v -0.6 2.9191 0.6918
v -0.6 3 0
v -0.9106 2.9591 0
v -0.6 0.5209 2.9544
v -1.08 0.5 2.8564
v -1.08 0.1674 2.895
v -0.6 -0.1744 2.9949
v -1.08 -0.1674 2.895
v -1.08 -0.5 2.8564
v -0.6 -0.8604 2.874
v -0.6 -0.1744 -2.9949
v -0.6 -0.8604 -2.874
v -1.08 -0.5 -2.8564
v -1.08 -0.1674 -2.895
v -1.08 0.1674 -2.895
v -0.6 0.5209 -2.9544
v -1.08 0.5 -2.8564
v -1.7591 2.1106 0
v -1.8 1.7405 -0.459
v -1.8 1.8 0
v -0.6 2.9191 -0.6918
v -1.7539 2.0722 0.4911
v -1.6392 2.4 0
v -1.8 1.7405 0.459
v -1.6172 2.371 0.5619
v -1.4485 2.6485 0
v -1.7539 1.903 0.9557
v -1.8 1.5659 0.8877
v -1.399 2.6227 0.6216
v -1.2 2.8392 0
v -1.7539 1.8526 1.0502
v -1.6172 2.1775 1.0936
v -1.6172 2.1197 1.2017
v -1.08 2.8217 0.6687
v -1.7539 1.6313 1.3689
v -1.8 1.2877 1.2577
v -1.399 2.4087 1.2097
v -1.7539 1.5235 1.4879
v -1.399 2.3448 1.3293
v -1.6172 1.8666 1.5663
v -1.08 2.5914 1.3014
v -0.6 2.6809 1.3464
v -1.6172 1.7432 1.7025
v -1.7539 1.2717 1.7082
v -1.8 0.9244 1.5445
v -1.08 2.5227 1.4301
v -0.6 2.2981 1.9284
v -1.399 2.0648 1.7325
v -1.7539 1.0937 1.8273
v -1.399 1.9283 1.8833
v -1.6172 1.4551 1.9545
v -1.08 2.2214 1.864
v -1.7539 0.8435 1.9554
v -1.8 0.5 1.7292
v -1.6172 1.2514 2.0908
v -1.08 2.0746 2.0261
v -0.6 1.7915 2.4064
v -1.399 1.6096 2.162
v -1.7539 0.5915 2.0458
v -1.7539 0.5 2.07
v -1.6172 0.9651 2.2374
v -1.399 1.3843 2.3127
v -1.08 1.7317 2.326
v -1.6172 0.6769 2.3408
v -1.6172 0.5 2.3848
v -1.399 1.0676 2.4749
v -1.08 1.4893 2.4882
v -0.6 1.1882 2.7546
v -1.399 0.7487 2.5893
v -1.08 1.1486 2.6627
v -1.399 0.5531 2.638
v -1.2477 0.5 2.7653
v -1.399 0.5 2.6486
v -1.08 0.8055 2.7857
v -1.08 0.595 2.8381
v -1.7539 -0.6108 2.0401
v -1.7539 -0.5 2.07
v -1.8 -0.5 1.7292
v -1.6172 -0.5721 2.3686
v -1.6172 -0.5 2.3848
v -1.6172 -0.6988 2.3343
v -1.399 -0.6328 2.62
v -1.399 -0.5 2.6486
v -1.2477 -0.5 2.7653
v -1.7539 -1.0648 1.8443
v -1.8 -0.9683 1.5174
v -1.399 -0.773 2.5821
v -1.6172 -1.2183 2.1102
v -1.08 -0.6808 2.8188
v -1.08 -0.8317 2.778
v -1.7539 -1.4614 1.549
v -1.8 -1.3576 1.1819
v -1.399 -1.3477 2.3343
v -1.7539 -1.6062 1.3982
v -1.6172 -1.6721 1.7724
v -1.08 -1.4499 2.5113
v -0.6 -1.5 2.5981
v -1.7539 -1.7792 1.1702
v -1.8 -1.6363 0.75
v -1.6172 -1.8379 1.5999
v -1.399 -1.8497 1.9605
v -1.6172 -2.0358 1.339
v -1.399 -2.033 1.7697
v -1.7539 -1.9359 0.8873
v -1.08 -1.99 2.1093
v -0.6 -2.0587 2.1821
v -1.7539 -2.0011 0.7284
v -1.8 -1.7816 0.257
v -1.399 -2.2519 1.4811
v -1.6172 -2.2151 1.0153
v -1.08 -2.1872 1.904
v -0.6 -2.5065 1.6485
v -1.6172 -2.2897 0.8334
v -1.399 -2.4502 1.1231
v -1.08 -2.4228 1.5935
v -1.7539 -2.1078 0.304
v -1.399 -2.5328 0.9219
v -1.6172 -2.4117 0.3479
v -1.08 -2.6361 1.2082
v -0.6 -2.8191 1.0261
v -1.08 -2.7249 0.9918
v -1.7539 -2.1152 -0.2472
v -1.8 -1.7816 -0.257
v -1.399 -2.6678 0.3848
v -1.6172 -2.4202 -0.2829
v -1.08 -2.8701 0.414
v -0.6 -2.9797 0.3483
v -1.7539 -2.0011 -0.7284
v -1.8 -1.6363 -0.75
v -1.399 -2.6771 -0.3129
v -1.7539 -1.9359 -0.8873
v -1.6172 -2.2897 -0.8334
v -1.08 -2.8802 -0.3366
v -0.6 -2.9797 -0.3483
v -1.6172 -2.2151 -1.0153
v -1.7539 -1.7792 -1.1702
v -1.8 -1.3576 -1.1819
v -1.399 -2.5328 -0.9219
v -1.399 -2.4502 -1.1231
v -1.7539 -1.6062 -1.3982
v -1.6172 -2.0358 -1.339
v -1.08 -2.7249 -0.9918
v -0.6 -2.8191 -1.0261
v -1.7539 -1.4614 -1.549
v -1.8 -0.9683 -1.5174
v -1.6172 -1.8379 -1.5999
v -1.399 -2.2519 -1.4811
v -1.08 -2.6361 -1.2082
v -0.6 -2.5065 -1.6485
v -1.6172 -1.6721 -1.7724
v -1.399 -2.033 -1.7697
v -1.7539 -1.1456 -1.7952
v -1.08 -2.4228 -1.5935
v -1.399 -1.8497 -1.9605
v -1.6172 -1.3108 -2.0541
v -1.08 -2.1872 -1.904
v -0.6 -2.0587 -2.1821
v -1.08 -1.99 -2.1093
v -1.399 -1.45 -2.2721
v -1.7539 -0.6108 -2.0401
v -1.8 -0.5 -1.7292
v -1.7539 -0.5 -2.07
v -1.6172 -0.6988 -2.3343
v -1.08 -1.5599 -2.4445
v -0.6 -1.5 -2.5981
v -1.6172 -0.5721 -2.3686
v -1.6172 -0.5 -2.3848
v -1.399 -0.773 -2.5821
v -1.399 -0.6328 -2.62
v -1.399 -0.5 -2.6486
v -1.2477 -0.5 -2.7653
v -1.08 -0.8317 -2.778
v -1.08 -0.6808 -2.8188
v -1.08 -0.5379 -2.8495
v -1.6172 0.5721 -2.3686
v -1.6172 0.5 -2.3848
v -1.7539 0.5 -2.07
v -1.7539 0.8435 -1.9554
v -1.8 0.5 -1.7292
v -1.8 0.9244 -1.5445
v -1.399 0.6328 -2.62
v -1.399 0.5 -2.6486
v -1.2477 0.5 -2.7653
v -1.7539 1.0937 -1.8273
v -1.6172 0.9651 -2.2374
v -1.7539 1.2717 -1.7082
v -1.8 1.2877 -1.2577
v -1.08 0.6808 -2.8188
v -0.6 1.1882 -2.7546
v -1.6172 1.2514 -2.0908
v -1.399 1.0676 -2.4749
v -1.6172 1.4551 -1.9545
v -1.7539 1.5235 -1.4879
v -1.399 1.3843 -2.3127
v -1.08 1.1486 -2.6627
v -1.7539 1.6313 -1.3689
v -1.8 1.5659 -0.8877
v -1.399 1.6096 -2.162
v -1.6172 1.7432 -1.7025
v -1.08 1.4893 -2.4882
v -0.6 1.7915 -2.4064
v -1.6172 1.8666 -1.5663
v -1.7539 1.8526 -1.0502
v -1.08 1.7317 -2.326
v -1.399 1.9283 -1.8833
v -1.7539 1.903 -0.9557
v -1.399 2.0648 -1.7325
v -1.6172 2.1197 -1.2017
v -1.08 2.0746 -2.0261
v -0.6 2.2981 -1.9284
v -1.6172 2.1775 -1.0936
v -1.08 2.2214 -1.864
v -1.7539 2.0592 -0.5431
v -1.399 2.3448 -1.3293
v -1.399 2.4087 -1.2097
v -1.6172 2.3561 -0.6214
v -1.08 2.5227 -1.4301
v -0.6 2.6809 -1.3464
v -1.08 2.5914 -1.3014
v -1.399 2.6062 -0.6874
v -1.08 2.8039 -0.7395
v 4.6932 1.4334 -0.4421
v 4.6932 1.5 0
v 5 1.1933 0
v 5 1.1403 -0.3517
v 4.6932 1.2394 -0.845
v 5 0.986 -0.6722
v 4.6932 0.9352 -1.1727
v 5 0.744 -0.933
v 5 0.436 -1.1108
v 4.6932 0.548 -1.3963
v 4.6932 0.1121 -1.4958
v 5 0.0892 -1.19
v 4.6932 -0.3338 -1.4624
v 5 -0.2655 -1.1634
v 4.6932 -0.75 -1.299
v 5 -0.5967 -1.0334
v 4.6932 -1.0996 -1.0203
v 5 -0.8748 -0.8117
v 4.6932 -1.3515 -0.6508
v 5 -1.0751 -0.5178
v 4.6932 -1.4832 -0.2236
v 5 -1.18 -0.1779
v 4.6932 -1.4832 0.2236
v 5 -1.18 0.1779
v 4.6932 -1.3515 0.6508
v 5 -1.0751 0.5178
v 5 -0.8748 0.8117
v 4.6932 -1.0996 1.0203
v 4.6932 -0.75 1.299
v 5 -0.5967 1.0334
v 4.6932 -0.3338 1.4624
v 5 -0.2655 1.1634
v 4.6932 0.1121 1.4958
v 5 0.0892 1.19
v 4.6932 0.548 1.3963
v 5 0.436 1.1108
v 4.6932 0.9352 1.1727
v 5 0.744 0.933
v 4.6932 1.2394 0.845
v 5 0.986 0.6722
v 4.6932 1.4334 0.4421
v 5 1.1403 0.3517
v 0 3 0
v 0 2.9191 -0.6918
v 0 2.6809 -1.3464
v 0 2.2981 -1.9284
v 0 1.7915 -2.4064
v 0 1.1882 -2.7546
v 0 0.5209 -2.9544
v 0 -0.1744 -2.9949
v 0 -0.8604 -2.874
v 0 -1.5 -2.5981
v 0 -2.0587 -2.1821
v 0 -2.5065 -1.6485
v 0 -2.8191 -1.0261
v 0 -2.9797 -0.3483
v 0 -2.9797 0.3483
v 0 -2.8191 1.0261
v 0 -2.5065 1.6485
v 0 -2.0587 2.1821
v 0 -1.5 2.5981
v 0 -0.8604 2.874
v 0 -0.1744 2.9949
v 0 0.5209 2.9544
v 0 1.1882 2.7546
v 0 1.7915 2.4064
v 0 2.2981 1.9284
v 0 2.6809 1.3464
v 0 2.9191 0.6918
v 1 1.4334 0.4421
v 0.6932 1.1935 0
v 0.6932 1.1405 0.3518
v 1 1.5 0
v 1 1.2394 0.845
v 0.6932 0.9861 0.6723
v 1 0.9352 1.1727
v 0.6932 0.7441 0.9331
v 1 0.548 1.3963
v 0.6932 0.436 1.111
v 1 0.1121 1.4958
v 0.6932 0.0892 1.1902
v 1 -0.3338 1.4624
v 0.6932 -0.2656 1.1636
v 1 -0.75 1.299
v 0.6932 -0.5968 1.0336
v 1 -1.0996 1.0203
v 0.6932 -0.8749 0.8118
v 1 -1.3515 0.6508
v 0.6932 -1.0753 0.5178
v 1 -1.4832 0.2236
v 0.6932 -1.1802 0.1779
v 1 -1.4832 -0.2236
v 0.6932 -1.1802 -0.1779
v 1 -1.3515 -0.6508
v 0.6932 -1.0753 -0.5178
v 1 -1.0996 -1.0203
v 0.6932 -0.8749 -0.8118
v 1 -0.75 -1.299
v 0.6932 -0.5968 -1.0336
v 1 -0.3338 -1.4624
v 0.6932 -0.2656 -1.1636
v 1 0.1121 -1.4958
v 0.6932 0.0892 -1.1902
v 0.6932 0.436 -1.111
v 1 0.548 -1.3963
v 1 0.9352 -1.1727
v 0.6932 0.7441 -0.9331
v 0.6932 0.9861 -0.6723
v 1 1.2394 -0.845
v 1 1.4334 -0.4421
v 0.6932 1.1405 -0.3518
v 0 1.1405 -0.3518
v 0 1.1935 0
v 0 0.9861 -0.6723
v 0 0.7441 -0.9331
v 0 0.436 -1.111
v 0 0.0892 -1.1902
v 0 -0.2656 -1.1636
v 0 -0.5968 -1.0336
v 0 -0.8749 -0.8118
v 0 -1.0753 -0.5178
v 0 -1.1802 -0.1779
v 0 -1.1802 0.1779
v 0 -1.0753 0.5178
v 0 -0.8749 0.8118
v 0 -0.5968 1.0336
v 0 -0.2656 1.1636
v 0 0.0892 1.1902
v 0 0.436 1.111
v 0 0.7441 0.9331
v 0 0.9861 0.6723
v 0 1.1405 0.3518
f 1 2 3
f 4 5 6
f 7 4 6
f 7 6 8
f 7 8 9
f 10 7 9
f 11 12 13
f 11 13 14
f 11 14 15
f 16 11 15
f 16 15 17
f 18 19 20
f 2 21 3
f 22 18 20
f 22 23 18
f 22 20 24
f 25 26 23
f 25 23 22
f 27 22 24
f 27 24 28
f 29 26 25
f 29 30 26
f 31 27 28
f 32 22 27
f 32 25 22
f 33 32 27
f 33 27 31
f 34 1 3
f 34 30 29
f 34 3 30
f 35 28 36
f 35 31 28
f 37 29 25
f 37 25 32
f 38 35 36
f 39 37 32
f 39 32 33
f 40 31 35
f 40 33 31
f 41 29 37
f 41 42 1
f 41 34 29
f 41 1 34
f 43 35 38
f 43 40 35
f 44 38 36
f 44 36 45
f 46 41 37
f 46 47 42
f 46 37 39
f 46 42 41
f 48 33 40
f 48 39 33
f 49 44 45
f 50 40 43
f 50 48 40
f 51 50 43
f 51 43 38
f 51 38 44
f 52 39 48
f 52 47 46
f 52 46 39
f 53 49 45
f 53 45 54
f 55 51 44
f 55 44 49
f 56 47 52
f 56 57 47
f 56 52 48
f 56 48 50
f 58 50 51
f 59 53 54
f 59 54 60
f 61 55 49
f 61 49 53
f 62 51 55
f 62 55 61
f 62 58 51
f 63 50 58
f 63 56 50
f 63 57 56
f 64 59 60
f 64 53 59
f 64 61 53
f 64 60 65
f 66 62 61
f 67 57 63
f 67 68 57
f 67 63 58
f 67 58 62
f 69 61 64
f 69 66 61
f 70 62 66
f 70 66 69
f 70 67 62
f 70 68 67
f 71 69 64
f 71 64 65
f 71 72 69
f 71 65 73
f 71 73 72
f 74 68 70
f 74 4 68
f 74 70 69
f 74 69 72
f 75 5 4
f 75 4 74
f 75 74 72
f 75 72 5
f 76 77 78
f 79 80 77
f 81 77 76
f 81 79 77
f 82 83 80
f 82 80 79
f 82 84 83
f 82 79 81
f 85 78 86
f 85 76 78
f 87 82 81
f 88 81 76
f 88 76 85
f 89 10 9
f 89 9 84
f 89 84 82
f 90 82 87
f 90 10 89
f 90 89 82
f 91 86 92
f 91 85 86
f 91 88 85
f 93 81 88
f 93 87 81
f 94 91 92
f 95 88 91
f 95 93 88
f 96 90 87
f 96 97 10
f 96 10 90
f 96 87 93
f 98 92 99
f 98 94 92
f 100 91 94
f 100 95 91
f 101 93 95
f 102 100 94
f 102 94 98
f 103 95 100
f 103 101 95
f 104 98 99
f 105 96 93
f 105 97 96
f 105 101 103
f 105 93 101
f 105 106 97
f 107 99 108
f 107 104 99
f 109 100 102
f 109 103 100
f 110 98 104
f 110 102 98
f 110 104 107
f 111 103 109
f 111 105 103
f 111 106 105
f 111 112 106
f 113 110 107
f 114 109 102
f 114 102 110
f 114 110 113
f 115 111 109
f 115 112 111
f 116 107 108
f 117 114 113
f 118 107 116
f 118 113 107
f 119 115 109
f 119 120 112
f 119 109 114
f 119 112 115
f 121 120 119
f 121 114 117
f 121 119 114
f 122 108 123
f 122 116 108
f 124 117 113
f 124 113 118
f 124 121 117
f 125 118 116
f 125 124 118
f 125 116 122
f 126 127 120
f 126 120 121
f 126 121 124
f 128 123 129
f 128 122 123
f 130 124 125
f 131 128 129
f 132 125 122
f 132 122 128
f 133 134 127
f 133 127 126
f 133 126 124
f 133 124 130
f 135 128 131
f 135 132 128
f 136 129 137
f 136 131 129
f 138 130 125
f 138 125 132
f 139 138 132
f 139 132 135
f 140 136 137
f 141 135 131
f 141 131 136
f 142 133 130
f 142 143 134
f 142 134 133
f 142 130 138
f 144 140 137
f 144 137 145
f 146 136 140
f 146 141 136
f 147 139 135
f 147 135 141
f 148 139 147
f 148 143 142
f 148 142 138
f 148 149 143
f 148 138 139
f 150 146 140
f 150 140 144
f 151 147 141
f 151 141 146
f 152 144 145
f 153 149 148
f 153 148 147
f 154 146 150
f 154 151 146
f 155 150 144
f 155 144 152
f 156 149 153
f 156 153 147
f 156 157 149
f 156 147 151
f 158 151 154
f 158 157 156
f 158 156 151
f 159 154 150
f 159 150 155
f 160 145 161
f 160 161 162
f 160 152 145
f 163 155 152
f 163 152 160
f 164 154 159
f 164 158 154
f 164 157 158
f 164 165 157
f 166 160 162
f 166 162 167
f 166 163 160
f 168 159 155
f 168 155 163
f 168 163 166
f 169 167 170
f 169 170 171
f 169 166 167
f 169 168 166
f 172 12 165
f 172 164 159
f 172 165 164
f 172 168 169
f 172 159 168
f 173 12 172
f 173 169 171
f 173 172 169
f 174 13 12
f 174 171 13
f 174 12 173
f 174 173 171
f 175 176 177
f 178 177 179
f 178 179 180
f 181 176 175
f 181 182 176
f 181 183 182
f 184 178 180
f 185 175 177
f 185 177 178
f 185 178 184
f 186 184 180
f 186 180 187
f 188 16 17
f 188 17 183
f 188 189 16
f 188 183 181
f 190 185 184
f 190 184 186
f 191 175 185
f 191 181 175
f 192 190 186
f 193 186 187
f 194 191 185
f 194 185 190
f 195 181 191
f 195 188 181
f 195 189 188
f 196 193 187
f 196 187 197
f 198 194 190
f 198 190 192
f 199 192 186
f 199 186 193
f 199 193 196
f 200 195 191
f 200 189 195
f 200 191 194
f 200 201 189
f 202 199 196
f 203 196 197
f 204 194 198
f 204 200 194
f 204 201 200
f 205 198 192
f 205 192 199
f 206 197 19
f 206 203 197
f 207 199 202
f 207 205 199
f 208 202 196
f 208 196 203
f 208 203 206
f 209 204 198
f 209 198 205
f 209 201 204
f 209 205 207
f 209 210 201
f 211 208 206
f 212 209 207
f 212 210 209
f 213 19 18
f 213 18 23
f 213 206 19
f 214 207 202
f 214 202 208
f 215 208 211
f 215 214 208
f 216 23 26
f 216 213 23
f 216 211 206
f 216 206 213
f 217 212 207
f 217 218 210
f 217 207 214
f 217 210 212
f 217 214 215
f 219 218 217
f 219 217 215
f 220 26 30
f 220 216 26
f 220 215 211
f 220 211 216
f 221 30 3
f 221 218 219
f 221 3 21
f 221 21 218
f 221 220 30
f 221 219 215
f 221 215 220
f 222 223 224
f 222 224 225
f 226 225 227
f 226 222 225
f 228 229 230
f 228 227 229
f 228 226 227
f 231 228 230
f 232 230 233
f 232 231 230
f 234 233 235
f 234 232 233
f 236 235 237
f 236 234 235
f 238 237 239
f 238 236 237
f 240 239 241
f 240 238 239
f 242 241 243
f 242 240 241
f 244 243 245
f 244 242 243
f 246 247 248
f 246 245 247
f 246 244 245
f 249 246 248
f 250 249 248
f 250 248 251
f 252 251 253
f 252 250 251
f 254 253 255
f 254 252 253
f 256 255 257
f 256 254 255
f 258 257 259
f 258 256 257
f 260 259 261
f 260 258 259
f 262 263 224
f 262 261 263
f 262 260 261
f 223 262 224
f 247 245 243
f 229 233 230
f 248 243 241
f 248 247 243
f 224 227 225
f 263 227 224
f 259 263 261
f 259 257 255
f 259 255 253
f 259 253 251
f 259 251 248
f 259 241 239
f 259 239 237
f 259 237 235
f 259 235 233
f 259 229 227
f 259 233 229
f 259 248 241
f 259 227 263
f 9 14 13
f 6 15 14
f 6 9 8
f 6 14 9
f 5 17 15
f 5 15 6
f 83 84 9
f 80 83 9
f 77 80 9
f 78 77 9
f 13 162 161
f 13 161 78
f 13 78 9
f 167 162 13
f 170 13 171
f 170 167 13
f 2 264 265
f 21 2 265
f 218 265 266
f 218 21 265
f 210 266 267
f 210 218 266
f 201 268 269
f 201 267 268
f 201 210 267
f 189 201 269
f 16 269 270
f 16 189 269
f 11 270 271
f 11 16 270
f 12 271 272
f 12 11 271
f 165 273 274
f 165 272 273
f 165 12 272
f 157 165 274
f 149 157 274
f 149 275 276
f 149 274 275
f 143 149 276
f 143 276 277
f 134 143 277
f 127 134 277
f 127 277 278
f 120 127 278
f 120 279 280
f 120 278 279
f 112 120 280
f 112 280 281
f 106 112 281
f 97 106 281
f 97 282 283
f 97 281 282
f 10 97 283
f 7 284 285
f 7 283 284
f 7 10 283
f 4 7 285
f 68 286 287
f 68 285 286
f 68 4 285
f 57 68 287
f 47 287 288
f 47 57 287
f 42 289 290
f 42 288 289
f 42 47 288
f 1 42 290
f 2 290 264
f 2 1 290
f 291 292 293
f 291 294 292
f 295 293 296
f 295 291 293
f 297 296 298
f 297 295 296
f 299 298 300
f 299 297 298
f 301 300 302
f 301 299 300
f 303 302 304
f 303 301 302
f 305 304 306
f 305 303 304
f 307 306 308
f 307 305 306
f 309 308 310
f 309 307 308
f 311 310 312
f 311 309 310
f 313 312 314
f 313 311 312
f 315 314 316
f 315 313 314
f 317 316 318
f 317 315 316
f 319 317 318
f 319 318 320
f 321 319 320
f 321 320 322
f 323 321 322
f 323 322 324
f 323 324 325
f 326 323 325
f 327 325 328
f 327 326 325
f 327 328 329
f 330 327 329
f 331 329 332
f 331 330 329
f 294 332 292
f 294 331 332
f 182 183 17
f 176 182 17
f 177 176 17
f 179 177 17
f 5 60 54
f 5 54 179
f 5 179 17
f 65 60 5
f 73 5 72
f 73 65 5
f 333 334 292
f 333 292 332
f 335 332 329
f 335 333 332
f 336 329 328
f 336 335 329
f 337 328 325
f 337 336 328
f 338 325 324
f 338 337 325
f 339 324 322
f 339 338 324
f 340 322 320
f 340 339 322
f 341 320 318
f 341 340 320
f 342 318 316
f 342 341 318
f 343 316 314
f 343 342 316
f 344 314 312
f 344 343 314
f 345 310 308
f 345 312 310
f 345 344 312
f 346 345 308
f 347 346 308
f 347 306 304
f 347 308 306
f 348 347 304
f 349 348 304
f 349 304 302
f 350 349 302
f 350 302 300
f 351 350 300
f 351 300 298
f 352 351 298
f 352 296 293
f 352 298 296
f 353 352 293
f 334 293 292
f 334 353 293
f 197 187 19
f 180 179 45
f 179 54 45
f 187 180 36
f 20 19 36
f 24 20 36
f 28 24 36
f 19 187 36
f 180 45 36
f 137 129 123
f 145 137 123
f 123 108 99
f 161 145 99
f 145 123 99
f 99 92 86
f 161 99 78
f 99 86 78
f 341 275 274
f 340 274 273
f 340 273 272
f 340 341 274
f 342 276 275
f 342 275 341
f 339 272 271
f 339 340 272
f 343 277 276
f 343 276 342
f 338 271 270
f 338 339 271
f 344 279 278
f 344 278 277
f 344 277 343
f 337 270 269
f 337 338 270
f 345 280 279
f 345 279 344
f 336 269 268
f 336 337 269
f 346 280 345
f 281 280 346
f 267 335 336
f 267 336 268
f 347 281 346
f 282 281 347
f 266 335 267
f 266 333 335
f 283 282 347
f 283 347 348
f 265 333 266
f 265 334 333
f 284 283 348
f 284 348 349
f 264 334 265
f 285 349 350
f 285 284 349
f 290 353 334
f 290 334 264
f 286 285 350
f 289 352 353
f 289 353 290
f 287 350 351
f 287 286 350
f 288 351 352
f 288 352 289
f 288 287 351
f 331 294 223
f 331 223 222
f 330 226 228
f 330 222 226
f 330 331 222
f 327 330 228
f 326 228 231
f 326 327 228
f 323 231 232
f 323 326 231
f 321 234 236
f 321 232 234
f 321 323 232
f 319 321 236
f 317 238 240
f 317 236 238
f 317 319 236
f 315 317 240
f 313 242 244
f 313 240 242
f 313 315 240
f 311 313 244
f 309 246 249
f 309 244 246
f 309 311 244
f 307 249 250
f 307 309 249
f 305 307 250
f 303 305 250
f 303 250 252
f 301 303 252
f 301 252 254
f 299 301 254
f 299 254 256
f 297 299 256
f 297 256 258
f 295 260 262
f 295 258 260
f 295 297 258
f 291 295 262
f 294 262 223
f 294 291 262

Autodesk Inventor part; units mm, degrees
ref_plane "YZ Plane" through (0, 0, 0) normal (1, 0, 0) x (0, 1, 0)
ref_plane "XZ Plane" through (0, 0, 0) normal (0, 1, 0) x (-1, 0, 0)
sketch "Sketch1" plane through (0, 0, 0) normal (0, 0, 1) x (1, 0, 0)
  line L0 (-1.8, 0) -> (5, 0)
  line L1 (5, 0) -> (5, 1.5)
  line L2 (5, 1.5) -> (1, 1.5)
  line L3 (1, 1.5) -> (0.6932, 1.1935)
  line L4 (0.6932, 1.1935) -> (0, 1.1935)
  line L5 (0, 1.1935) -> (0, 3)
  line L6 (-3.16, 0) -> (6.36, 0) projected
  line L7 (0, -0.6) -> (0, 3.6) projected
  line L8 (-1.8, 0) -> (-1.8, 2.9997)
  line L9 (0, 3) -> (-1.8, 2.9997)
  line L10 (1, 1.5) -> (0, 1.5) construction
  dimension "d0" = 5
  dimension "d1" = 4
  dimension "d2" = 0.3068
  dimension "d3" = 1.8
  dimension "d4" = 3
  dimension "d5" = 2.387
  dimension "d9" = 6
  dimension "d10" = 0.01
revolve "Body" add sketch "Sketch1" angle 360 about axis through (-1.8, 0, 0) along (1, 0, 0)
sketch "Sketch2" plane through (-1.8, 0, 0) normal (-1, 0, 0) x (0, 0, 1)
  circle A0 centre (0, 0) radius 3 projected
  line L0 (0, 0) -> (0, 2.9997) projected
  line L1 (-3, 0.5) -> (3, 0.5)
  line L2 (3, 0.5) -> (3, -0.5)
  line L3 (3, -0.5) -> (-3, -0.5)
  line L4 (-3, -0.5) -> (-3, 0.5)
  line L5 (-3, 0) -> (3, 0) construction
  line L6 (0, 0.5) -> (0, -0.5) construction
  dimension "d11" = 1
  dimension "d12" = 6
fillet "Fillet1" radius 1.2 1 edges at (-1.8, -2.9997, 0)
extrude "Slot" cut sketch "Sketch2" against normal blind 0.72 contours A0 L3 L1 | L2 L3 A0 | A0 L1 L2 | L3 L4 A0 | A0 L4 L1
thread "Thread" size "M3x0.5" class "6g" standard "ISO Metric profile" length 4
chamfer "Chamfer1" distance 0.3067 distance2 0.3068 1 edges at (5, -1.5, 0) measured on face at (5, 0.8773, -0.3972)
ref_plane "Work Plane1" through (30.1625, 0, 0) normal (0, 0, -1) x (1, 0, 0)
equation "\"d11\" = SBR"
equation "\"d12\" = KOD"
equation "\"d14\" = RR"
equation "\"d19\" = STI"
equation "\"d15\" = GEL"
equation "\"d17\" = -0.5 * SPD + 0.5 * GD"
equation "\"d0\" = NLG"
equation "\"d1\" = GEL"
equation "\"d3\" = KOH"
equation "\"d4\" = GD"
equation "\"d5\" = BDM"
equation "\"d9\" = KOD"
equation "\"d10\" = KEWI"
equation "\"GD\" = NND"
equation "\"NLG\" = 5"
equation "\"GEL\" = 4"
equation "\"KOD\" = 6"
equation "\"KOH\" = 1.8"
equation "\"GAL\" = 0.61345 * PTC"
equation "\"SPD\" = NND - 1.2269 * PTC"
equation "\"BDM\" = 2.387"
equation "\"GUL\" = 0.61345 * PTC"
equation "\"RR\" = 1.2"
equation "\"SBR\" = 1"
equation "\"STI\" = 0.72"
equation "\"KEWI\" = 0.01deg"
equation "\"PTC\" = 0.5"
equation "\"THREADDIA\" = 3"
equation "\"TOA\" = 30deg"
equation "\"NND\" = 3"
equation "\"RR1\" = 0.3"
equation "\"GD1\" = THREADDIA - 1.2269 * PTC"
properties part number "AS 1427 - M3 x 5" material "Steel, Mild"
